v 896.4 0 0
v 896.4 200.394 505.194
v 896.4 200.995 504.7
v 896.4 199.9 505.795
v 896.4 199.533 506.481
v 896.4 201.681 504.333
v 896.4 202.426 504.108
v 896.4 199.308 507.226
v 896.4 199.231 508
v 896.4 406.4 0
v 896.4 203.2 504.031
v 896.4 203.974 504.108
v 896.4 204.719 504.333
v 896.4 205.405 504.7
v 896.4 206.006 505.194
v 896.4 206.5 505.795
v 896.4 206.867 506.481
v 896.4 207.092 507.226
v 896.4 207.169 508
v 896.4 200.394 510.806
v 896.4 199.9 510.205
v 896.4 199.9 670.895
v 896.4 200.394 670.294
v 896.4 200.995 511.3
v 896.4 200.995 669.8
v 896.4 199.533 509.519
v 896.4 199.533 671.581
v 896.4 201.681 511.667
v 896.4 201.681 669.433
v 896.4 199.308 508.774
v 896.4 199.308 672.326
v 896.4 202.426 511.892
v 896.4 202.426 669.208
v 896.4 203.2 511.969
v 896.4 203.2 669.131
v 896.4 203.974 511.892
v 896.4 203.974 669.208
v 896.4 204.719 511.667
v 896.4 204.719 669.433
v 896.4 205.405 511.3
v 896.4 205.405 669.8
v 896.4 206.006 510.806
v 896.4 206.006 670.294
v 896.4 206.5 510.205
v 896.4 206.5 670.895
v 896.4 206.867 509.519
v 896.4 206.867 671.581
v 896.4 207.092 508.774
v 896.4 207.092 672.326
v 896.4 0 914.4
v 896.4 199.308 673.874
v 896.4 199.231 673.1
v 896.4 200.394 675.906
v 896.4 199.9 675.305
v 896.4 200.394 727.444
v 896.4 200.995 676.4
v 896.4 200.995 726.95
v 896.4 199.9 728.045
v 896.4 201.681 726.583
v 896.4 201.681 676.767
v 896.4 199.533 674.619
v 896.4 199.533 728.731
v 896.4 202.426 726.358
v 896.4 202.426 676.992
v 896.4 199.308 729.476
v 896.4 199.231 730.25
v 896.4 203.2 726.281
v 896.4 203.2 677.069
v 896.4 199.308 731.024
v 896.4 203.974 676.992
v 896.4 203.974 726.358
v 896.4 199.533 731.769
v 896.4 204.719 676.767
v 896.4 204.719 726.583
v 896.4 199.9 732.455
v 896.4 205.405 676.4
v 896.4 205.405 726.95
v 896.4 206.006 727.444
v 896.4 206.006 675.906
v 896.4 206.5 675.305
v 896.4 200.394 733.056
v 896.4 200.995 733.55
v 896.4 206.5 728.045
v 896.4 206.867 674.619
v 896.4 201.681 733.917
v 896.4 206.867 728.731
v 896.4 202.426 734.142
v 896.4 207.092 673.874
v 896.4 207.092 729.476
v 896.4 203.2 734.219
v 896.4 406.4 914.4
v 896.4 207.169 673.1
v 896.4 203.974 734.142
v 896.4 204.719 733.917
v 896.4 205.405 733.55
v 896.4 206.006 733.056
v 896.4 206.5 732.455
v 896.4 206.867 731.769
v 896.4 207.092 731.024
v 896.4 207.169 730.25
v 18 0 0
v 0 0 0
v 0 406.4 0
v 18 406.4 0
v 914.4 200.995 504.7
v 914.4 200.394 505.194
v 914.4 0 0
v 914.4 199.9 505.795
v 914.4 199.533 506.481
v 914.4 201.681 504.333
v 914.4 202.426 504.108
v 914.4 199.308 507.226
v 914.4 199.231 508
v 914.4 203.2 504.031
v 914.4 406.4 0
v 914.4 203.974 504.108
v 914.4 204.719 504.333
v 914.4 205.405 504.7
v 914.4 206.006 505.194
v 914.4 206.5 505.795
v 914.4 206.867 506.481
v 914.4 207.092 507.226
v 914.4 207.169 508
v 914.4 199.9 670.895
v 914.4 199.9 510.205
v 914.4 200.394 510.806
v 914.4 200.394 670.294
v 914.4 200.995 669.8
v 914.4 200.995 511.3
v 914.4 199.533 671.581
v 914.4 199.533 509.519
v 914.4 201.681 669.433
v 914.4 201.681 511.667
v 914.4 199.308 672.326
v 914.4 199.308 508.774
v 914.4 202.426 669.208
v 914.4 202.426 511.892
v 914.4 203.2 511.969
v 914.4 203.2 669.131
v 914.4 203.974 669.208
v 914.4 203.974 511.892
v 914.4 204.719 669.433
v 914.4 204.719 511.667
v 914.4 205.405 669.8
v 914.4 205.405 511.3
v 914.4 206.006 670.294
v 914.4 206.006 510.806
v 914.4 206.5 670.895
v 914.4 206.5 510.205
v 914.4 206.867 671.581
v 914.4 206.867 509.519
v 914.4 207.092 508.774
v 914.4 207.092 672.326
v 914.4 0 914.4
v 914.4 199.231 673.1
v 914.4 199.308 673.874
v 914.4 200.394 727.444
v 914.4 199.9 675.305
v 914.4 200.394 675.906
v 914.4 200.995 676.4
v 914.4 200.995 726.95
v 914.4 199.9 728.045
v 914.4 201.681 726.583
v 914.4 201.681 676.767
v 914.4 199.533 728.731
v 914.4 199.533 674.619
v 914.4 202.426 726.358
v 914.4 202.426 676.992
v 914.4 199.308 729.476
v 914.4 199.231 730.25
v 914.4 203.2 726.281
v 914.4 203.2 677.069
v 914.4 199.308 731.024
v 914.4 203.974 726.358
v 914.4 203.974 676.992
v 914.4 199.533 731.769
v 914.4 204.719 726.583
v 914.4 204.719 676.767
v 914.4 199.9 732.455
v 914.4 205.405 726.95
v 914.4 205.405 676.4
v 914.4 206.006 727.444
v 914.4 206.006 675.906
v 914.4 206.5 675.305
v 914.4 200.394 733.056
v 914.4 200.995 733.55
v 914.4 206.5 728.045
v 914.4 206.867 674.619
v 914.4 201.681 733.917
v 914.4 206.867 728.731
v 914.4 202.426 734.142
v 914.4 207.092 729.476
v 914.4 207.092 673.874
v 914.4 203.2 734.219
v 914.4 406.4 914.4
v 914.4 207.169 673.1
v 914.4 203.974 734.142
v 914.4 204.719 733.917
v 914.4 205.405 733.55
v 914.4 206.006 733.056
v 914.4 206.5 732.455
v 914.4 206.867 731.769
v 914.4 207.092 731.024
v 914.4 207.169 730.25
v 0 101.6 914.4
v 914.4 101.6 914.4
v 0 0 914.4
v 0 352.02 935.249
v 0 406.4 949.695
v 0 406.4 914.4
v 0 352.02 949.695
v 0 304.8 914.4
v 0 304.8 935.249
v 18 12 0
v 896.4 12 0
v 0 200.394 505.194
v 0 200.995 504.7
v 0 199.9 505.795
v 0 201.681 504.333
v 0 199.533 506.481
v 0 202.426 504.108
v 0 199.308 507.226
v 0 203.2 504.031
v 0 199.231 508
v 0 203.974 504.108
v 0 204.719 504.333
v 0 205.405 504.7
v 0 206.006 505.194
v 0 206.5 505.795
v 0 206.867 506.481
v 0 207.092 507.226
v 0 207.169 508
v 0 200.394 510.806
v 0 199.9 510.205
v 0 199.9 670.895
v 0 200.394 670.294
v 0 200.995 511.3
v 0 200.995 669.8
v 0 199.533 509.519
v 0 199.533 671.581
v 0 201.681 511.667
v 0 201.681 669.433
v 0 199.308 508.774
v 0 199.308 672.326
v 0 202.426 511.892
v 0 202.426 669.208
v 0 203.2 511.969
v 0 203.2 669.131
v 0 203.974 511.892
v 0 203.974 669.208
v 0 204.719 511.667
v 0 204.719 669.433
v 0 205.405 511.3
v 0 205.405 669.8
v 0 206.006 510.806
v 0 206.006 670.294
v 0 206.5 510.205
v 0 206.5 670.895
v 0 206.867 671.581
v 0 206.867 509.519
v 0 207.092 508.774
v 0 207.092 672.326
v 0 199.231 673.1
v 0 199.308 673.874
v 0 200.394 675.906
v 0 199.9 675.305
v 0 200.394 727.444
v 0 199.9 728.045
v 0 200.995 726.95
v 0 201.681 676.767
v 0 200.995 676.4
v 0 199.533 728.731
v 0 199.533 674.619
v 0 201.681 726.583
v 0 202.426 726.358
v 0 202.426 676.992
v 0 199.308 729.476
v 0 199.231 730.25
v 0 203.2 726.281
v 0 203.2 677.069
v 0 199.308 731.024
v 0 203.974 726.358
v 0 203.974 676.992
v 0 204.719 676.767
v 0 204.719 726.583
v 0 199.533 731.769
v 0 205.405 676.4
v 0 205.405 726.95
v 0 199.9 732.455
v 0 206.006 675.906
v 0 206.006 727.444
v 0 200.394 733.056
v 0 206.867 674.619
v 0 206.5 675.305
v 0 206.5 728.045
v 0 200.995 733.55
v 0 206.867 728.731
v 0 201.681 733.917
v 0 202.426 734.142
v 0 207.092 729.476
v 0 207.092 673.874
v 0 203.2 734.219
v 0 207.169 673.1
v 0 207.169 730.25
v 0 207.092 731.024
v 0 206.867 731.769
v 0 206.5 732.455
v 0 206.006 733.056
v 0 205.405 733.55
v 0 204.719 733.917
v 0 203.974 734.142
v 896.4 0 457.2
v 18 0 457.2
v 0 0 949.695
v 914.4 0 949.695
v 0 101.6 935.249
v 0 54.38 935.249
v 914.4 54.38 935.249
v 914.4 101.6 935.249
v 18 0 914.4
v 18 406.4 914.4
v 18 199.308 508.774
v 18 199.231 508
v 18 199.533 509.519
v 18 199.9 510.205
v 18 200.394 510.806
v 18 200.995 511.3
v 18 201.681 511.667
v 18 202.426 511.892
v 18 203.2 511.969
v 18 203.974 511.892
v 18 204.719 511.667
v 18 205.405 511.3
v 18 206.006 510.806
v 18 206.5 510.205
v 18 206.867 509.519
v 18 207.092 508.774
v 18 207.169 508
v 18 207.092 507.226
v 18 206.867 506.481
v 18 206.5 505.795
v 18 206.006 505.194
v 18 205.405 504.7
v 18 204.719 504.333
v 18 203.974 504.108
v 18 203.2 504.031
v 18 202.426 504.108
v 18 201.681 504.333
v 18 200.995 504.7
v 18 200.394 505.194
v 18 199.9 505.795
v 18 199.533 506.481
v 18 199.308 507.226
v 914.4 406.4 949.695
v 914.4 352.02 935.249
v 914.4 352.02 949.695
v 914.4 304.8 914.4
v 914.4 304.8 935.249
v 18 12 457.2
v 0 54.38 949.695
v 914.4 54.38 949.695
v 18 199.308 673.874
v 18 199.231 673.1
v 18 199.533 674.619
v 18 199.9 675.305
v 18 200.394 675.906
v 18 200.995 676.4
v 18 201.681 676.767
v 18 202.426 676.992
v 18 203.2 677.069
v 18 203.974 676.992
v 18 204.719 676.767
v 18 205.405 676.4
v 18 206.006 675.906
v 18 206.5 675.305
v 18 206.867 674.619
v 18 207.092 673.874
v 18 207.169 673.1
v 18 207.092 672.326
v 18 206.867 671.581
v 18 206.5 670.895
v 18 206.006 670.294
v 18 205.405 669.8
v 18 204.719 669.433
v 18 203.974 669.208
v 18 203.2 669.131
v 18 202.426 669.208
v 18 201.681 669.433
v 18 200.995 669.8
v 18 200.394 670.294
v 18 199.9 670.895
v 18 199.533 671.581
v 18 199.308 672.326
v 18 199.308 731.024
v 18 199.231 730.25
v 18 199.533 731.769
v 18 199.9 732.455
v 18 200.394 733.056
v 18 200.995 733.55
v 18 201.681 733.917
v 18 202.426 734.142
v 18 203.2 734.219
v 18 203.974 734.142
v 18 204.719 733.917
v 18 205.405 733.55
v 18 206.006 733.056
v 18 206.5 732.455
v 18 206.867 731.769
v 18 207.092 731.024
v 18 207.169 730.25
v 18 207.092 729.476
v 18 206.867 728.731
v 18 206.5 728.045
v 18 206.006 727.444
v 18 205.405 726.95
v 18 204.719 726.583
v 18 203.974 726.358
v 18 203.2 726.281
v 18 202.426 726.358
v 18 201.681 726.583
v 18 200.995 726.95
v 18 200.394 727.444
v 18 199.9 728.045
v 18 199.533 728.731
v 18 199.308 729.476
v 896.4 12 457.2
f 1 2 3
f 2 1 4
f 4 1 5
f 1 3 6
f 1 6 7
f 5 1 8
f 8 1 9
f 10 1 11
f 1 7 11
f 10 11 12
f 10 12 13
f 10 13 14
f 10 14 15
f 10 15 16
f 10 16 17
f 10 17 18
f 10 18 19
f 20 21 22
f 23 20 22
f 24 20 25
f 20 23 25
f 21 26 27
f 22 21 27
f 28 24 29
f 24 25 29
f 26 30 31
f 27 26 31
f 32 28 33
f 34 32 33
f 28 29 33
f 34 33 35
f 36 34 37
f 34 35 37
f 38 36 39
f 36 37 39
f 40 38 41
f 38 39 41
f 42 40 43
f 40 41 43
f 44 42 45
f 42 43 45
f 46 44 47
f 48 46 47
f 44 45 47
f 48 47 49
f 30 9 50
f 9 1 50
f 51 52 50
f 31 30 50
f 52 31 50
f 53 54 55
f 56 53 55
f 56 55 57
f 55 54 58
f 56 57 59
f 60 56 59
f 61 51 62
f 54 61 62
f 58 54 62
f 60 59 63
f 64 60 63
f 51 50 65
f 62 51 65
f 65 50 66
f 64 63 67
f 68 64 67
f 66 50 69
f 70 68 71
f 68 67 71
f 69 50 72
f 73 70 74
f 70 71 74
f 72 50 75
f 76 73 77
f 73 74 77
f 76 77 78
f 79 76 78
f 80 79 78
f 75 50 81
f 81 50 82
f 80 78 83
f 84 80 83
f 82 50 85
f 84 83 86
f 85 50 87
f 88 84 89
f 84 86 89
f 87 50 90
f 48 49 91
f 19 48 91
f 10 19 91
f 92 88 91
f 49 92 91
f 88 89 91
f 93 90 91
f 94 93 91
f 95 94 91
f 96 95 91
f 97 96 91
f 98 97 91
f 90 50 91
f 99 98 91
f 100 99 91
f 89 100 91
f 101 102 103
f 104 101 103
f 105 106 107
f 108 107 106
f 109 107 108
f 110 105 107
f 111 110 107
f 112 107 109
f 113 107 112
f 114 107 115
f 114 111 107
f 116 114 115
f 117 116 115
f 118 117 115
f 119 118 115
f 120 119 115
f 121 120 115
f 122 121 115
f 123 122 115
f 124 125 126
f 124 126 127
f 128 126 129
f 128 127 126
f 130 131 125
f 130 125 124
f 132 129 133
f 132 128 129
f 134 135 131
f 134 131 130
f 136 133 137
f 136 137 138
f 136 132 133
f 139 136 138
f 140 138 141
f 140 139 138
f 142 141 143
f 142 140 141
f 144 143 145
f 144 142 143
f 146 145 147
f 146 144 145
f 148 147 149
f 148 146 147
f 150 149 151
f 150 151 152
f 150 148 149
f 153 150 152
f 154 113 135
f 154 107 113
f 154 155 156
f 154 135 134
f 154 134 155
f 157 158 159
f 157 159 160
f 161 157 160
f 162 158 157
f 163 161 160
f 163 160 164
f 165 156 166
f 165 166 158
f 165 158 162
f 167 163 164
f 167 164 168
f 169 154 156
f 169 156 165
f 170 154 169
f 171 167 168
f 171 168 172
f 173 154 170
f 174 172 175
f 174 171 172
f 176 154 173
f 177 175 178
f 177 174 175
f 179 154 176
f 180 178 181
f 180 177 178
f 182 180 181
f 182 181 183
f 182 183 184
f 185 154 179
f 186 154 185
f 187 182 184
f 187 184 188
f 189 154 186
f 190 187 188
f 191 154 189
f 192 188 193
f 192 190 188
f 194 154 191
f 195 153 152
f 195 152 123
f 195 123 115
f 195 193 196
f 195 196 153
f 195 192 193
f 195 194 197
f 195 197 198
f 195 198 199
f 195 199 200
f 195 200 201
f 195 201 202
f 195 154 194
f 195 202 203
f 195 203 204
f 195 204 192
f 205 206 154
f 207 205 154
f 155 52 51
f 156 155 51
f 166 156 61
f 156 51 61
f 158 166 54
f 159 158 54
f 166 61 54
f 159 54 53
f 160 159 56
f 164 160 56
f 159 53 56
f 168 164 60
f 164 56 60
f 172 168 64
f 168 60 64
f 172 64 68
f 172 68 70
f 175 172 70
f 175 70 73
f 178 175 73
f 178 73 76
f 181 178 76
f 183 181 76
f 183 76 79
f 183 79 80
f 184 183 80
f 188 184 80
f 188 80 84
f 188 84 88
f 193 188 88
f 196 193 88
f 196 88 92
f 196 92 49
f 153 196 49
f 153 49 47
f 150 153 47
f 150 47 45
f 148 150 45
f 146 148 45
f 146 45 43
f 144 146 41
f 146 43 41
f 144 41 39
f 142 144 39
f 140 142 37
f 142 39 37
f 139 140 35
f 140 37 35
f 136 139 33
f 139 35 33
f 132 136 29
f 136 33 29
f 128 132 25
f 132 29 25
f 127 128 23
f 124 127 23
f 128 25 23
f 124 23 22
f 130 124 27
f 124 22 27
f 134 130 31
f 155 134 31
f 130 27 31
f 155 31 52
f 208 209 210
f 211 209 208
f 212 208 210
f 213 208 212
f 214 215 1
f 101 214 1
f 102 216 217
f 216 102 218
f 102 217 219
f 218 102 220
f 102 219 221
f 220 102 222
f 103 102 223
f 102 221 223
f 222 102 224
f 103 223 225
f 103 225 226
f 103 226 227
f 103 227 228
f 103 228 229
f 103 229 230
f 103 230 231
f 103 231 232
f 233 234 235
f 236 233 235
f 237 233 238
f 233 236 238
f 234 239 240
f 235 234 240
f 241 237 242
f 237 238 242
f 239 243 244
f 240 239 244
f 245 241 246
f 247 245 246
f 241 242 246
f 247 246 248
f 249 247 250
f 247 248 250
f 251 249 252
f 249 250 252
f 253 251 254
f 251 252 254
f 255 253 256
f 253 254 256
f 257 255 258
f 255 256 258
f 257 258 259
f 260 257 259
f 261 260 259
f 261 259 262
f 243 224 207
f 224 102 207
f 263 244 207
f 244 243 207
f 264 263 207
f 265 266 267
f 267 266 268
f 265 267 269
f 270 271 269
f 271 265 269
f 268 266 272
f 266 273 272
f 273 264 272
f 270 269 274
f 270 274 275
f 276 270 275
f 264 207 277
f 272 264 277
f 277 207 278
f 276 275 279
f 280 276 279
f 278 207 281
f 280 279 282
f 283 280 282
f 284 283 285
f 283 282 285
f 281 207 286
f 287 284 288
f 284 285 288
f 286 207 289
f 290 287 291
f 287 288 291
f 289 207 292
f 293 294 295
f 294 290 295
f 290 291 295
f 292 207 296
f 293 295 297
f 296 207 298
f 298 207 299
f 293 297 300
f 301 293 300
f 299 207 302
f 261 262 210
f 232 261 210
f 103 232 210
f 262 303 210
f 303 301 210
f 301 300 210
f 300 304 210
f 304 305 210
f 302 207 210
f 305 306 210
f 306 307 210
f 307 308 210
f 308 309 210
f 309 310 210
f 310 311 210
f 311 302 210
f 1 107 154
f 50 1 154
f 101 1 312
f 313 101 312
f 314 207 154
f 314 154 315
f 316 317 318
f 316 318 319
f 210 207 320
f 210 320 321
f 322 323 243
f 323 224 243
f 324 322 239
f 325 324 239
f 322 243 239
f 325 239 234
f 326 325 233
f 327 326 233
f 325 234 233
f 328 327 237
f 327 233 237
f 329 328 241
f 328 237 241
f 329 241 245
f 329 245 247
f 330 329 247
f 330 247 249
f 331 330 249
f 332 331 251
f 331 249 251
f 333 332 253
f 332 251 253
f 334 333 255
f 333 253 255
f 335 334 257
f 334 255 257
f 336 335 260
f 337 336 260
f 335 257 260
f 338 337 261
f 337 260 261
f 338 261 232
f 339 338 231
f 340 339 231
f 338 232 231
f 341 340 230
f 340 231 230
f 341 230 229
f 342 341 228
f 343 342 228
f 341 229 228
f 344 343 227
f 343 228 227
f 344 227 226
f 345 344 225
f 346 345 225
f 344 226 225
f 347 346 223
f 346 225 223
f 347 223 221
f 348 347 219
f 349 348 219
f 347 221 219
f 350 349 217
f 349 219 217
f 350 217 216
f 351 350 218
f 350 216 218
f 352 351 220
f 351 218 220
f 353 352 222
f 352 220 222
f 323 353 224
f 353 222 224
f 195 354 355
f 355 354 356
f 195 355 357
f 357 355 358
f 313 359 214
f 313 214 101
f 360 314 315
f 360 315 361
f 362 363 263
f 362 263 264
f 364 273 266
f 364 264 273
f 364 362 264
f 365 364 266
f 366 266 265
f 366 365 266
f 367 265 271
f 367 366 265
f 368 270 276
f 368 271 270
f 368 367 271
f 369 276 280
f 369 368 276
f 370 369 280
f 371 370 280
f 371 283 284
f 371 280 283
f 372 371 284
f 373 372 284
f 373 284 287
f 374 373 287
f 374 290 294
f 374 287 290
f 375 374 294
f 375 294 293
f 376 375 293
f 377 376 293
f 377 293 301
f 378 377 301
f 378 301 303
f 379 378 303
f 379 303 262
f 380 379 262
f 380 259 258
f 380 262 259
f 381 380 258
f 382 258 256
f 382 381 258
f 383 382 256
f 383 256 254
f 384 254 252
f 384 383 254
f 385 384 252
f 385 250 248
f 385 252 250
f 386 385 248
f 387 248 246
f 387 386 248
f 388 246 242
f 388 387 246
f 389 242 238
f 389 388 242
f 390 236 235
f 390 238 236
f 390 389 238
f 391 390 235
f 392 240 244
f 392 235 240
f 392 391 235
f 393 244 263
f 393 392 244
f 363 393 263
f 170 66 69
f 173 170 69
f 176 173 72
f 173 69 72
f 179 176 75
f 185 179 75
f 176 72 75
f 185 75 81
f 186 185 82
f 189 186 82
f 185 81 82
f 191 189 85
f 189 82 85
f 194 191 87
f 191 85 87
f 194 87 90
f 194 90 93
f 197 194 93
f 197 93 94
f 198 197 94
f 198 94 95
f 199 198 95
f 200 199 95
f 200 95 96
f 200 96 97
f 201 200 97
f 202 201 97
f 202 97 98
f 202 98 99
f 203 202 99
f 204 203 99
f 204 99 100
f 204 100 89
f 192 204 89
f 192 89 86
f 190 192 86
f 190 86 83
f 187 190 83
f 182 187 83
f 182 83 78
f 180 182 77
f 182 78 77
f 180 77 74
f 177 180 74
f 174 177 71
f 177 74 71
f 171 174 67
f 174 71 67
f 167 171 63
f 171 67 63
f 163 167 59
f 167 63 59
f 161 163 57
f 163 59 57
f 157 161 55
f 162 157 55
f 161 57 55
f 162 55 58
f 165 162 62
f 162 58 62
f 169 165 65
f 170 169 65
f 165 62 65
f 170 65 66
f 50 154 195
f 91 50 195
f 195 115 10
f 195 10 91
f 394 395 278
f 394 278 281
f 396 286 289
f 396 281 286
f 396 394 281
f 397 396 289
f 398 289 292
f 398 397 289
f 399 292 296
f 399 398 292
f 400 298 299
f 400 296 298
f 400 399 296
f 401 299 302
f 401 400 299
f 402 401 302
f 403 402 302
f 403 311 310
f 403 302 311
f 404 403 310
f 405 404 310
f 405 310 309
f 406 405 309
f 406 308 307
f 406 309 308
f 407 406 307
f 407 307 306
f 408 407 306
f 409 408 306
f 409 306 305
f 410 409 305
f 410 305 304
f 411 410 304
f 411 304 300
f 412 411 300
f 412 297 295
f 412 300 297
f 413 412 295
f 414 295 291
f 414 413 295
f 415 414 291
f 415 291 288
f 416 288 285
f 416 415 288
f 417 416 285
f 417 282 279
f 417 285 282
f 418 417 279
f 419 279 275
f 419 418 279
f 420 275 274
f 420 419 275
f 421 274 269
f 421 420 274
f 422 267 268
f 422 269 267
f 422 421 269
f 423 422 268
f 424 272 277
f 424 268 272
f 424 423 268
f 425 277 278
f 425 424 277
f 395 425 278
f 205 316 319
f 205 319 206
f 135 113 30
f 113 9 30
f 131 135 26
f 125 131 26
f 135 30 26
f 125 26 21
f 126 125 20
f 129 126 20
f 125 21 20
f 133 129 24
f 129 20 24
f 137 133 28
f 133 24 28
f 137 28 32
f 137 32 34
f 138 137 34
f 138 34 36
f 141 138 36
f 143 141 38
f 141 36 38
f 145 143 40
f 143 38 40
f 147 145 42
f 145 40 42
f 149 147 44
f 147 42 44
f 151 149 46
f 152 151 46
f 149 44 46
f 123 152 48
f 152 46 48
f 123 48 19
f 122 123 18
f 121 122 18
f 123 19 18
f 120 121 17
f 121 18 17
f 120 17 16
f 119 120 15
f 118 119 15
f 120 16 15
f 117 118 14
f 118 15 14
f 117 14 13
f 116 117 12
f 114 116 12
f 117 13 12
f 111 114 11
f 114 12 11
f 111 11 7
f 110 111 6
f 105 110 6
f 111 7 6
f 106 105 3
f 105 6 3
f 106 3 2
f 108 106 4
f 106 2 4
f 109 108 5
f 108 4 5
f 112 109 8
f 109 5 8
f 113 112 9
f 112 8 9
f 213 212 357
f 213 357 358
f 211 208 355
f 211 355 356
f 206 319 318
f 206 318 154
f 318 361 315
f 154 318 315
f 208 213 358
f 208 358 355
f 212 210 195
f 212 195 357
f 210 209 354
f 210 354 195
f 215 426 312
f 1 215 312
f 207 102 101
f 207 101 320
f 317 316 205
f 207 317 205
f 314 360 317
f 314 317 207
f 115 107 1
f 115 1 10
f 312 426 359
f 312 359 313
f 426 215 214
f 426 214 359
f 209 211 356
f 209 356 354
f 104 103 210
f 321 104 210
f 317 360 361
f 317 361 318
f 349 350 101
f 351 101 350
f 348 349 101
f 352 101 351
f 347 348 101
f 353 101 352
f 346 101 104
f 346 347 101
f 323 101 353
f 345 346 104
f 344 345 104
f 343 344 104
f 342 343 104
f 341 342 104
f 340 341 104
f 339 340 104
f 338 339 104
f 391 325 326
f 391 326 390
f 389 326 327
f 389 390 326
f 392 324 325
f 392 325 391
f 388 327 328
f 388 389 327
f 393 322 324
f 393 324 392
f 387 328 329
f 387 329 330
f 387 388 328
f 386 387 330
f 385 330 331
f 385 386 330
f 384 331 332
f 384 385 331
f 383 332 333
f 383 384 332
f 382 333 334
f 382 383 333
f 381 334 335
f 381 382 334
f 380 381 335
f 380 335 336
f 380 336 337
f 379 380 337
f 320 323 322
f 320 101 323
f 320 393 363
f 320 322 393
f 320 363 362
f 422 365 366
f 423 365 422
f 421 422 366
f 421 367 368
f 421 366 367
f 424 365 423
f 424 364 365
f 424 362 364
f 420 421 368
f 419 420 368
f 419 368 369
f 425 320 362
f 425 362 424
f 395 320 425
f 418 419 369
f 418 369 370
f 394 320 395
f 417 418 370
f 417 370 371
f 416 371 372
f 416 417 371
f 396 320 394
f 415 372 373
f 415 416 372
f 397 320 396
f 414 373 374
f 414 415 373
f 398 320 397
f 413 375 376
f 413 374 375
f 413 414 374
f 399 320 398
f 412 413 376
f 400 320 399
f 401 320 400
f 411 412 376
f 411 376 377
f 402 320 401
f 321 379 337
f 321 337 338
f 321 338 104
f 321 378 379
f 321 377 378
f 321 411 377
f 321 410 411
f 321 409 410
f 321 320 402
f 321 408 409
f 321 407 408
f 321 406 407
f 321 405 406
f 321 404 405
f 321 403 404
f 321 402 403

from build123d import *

# Parameters (mm, degrees)
F0_W     = 406.4
F0_H     = 914.4
F1_DEPTH = 18
F4_R     = 3.96875
F5_DEPTH = 1016
F7_DEPTH = 914.4
F8_W     = 12
F8_H     = 457.2
F9_DEPTH = 878.4


with BuildPart() as f1:
    # F0 (on Right) → F1 (new body)
    with BuildSketch(Plane.YZ):
        with Locations((203.2, 457.2)):
            Rectangle(F0_W, F0_H)
    extrude(amount=F1_DEPTH)


with BuildPart() as f3_1:
    # F3: instance of F1
    add(f1.part.mirror(Plane.YZ.offset(457.2)))


with BuildPart() as f5_tool:
    # F4 (on face) → F5 (new body, symmetric)
    with BuildSketch(Plane(origin=(896.4, 0, 0), x_dir=(0, -1, 0), z_dir=(-1, 0, 0))):
        with Locations((-203.2, 730.25)):
            Circle(F4_R)
        with Locations((-203.2, 673.1)):
            Circle(F4_R)
        with Locations((-203.2, 508)):
            Circle(F4_R)
    extrude(amount=F5_DEPTH, both=True)


with BuildPart() as f1_1:
    add(f1.part)

    # F5: cut by f5_tool
    add(f5_tool.part, mode=Mode.SUBTRACT)


with BuildPart() as f3_1_1:
    add(f3_1.part)

    # F5: cut by f5_tool
    add(f5_tool.part, mode=Mode.SUBTRACT)


with BuildPart() as f7:
    # F6 (on face) → F7 (new body, through all)
    with BuildSketch(Plane(origin=(0, 0, 0), x_dir=(0, -1, 0), z_dir=(-1, 0, 0))):
        Polygon((-101.6, 914.4), (0, 914.4), (0, 949.6947526932), (-54.3800343513, 949.6947526932), (-54.3800343513, 935.2494478226), (-101.6, 935.2494478226), align=None)
    extrude(amount=-F7_DEPTH)


with BuildPart() as f7b:
    # F6 (on face) → F7, piece 2 (new body, through all)
    with BuildSketch(Plane(origin=(0, 0, 0), x_dir=(0, -1, 0), z_dir=(-1, 0, 0))):
        Polygon((-406.4, 949.6947526932), (-406.4, 914.4), (-304.8, 914.4), (-304.8, 935.2494478226), (-352.0199656487, 935.2494478226), (-352.0199656487, 949.6947526932), align=None)
    extrude(amount=-F7_DEPTH)


with BuildPart() as f9:
    # F8 (on face) → F9 (new body, through all)
    with BuildSketch(Plane(origin=(896.4, 0, 0), x_dir=(0, -1, 0), z_dir=(-1, 0, 0))):
        with Locations((-6, 228.6)):
            Rectangle(F8_W, F8_H)
    extrude(amount=F9_DEPTH)


solid = Compound([f1_1.part, f3_1_1.part, f7.part, f7b.part, f9.part])
